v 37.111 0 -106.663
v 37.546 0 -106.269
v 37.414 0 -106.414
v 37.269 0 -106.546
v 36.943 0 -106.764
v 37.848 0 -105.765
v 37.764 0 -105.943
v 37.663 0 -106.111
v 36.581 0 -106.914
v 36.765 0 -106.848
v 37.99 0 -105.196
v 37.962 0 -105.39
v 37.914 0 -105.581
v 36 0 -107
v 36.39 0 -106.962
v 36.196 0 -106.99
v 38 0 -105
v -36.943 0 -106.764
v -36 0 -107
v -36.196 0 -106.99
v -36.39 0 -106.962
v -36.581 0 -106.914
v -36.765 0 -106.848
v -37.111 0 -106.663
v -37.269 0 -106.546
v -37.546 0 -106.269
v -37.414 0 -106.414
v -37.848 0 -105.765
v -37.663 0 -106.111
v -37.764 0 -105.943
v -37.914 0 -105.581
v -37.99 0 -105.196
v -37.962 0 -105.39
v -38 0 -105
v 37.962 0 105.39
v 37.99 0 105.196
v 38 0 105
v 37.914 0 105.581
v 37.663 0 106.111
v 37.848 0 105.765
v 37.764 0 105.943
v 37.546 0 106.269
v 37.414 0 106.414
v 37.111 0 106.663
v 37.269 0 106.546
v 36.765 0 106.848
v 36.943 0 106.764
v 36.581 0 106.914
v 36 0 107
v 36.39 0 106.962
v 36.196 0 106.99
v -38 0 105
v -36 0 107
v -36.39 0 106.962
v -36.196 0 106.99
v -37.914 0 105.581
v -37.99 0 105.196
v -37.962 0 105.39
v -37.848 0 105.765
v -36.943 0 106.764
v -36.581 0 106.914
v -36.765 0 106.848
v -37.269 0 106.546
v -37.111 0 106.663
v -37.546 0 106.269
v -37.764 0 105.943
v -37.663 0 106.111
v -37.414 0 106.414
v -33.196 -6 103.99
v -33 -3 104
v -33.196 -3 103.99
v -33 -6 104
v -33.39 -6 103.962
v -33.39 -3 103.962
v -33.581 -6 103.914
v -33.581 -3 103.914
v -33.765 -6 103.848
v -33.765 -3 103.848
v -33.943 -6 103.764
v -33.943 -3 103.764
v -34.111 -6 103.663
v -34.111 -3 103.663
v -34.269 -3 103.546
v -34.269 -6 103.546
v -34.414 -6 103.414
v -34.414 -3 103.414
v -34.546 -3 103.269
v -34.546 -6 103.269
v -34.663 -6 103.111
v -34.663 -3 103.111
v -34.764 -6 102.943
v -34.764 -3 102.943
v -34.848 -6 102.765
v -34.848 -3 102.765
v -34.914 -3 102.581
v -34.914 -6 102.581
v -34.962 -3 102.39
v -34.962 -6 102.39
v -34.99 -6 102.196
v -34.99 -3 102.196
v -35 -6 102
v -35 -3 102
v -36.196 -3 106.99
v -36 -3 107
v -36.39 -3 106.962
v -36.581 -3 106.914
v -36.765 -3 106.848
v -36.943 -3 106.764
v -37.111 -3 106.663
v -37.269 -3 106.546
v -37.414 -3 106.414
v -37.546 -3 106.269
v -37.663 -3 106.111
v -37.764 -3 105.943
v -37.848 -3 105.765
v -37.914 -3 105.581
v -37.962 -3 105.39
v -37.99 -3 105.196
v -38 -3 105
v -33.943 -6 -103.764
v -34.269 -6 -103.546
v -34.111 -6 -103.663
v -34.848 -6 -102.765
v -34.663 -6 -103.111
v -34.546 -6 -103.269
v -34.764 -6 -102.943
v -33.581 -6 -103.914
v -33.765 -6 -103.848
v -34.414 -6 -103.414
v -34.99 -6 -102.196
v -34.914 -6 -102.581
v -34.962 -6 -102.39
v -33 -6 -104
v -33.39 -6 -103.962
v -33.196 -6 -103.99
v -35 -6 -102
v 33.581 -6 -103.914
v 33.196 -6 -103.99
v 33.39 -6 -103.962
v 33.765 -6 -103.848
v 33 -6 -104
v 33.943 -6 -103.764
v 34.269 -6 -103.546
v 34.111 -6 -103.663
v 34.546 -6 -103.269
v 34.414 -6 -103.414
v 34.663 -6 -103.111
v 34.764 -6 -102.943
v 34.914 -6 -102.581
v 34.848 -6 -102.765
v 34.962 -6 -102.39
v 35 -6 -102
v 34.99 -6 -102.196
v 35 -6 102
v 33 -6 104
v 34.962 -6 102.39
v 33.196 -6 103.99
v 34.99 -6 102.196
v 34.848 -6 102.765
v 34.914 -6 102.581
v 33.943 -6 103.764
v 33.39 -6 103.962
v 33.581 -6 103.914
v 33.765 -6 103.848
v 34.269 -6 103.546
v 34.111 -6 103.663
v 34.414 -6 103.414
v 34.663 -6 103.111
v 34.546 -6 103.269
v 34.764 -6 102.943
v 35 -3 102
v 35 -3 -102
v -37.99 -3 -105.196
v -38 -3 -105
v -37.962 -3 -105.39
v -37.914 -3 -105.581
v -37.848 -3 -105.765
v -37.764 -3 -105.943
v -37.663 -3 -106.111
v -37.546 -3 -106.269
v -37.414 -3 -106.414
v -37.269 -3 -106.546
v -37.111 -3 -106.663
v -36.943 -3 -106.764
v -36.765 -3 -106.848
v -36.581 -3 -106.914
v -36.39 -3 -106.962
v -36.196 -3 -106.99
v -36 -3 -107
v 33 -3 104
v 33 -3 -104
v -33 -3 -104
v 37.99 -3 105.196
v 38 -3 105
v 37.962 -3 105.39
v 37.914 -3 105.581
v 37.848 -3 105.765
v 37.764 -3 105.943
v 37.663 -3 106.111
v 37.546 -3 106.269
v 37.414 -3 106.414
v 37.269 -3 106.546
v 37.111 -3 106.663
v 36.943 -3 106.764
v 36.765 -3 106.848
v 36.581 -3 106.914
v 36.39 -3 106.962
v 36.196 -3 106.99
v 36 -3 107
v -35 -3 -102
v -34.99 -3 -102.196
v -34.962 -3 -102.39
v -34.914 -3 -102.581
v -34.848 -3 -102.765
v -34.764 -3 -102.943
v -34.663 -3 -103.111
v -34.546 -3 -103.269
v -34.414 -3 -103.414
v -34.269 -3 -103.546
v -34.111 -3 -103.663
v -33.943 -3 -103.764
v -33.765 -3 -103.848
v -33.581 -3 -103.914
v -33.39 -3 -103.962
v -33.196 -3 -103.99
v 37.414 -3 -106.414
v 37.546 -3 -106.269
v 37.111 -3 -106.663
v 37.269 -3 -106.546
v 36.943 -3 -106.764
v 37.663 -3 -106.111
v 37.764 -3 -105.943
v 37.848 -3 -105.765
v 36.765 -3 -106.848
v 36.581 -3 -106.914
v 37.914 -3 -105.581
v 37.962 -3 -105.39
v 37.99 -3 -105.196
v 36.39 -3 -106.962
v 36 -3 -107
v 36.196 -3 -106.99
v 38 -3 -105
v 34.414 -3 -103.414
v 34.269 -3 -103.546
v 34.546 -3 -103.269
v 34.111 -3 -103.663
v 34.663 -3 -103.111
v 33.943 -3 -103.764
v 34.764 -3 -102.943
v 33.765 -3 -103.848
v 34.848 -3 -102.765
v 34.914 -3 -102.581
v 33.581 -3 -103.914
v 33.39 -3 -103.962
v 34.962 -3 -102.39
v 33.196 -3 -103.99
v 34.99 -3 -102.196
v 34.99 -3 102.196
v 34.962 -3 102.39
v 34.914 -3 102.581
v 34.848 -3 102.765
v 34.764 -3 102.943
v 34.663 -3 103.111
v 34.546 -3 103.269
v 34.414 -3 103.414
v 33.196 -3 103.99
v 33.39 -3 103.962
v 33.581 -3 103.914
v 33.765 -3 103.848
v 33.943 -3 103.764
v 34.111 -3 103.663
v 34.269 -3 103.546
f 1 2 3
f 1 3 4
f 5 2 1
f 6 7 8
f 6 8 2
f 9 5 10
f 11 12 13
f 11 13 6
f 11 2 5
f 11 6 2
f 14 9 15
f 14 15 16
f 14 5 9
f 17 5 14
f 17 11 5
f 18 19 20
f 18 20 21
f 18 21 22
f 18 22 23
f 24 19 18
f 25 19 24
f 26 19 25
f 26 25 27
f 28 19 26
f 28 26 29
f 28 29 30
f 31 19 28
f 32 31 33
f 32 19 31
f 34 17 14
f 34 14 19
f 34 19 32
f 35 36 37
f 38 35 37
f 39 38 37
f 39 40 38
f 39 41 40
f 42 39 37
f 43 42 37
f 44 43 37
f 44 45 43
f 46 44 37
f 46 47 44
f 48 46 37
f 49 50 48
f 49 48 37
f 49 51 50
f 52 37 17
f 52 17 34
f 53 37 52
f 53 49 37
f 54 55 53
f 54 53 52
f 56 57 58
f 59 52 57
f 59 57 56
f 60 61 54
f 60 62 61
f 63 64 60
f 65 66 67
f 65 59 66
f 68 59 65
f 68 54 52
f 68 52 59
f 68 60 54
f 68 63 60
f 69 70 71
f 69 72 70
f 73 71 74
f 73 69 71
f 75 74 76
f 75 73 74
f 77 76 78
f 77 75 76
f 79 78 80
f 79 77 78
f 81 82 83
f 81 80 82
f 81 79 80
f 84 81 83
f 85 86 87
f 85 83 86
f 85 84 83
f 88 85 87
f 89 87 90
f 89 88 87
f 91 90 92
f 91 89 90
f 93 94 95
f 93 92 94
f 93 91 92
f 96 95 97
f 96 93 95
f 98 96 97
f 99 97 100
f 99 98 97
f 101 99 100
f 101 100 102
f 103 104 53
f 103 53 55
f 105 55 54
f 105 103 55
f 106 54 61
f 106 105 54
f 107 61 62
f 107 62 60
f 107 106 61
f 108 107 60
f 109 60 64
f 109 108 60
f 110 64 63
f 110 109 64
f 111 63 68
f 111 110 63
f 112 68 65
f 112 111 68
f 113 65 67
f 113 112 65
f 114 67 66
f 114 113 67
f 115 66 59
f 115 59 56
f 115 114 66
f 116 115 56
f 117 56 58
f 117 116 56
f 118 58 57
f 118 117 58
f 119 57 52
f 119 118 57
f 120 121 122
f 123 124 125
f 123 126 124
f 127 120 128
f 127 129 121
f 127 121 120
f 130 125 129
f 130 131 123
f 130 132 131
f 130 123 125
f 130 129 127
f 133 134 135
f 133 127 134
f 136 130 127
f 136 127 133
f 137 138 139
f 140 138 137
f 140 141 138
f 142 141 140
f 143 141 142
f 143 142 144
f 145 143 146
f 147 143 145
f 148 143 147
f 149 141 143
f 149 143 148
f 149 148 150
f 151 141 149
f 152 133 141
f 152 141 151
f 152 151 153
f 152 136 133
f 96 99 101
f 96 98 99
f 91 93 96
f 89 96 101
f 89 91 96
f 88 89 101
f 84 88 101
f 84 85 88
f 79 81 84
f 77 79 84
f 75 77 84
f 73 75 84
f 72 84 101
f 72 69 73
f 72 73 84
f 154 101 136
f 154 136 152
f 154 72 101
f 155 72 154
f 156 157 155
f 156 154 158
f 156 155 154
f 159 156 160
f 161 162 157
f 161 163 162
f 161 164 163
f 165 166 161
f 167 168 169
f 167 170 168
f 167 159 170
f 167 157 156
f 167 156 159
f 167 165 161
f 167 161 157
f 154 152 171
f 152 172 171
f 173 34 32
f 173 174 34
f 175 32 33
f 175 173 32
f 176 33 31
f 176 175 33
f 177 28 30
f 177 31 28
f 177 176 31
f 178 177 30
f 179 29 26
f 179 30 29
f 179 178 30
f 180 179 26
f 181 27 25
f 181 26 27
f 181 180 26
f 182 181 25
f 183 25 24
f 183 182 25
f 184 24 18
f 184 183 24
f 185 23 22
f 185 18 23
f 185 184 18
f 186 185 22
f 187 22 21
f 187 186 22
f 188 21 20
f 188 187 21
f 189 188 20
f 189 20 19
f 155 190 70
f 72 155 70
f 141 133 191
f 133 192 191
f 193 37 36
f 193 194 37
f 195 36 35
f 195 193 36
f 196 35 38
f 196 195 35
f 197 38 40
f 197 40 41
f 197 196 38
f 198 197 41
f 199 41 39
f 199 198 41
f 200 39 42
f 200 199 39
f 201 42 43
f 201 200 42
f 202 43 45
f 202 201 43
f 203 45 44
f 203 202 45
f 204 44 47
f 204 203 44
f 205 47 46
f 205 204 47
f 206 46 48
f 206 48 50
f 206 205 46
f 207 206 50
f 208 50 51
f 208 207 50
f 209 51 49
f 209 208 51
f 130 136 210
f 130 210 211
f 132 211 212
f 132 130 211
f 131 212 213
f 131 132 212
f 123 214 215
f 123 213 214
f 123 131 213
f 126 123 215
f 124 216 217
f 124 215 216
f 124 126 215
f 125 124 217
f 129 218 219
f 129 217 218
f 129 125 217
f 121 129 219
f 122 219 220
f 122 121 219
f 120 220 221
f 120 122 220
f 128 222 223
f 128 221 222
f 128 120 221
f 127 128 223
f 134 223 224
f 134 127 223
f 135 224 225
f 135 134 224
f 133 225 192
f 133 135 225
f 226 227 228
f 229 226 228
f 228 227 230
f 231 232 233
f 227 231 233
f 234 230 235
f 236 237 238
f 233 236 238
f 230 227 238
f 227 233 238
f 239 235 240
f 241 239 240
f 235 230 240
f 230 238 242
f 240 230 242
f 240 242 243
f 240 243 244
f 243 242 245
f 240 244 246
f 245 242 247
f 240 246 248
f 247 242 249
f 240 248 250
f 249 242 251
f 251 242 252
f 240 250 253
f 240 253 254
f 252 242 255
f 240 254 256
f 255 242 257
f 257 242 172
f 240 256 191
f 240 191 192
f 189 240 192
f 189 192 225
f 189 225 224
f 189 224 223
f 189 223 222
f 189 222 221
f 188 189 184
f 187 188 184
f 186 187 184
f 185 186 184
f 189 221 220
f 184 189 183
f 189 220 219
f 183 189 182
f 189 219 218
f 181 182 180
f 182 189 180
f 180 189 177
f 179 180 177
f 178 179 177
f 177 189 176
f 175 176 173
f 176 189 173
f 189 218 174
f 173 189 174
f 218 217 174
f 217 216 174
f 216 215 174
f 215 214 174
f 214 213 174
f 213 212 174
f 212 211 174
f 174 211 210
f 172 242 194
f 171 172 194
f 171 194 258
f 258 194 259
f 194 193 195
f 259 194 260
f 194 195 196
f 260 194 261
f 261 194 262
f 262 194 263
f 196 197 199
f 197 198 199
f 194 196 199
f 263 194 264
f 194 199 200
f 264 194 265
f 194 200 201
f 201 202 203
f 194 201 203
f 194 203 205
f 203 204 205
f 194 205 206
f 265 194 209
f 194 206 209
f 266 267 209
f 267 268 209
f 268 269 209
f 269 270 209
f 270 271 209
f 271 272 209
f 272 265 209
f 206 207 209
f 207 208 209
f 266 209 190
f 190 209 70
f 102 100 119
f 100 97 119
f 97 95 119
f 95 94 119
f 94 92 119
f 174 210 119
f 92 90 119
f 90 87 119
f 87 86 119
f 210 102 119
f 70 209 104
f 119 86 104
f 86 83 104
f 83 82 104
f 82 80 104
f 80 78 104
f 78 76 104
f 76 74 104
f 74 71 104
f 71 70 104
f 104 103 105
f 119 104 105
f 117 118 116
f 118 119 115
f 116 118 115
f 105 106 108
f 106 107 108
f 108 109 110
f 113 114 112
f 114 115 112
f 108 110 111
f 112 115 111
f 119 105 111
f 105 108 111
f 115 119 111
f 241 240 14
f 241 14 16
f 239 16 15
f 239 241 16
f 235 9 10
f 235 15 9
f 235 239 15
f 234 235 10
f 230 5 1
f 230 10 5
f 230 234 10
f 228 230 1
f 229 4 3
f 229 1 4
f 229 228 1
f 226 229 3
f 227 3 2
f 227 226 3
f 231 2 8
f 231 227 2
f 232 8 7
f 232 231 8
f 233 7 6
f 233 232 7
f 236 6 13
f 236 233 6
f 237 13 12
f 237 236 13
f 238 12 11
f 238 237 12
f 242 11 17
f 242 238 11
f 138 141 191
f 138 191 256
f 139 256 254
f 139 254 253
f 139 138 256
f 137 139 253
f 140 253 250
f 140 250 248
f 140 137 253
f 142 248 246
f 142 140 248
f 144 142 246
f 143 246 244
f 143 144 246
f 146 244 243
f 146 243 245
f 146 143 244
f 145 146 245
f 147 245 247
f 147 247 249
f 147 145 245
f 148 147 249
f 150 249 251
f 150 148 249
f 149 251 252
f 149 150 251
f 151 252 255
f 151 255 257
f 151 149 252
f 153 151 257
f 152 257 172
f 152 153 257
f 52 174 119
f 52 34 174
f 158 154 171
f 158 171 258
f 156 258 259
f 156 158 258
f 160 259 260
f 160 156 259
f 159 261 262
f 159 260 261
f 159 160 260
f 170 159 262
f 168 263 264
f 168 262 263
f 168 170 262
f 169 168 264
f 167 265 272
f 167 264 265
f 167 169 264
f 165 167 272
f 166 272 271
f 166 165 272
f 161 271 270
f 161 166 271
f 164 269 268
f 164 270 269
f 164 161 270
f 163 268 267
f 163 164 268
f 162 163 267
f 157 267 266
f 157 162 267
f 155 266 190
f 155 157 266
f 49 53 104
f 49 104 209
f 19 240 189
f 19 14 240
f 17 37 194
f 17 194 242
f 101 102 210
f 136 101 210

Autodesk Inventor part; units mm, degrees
ref_plane "YZ Plane" through (0, 0, 0) normal (1, 0, 0) x (0, 1, 0)
ref_plane "XZ Plane" through (0, 0, 0) normal (0, 1, 0) x (-1, 0, 0)
ref_plane "XY Plane" through (0, 0, 0) normal (0, 0, 1) x (1, 0, 0)
sketch "Sketch1" plane through (0, 0, 0) normal (0, 1, 0) x (-1, 0, 0)
  line L0 (-38, -107) -> (38, -107)
  line L1 (38, -107) -> (38, 107)
  line L2 (38, 107) -> (-38, 107)
  line L3 (-38, 107) -> (-38, -107)
  line L4 (-38, -107) -> (38, 107) construction
  line L5 (38, -107) -> (-38, 107) construction
  point P0 (0, 0)
  dimension "d0" = 76
  dimension "d1" = 214
extrude "Extrusion1" add sketch "Sketch1" against normal blind 3
sketch "Sketch2" plane through (0, -3, 0) normal (0, -1, 0) x (1, 0, 0)
  line L0 (-38, 107) -> (-38, -107) projected
  line L1 (-38, -107) -> (38, -107) projected
  line L2 (38, -107) -> (38, 107) projected
  line L3 (38, 107) -> (-38, 107) projected
  line L4 (35, 104) -> (-35, 104)
  line L5 (-35, 104) -> (-35, -104)
  line L6 (-35, -104) -> (35, -104)
  line L7 (35, -104) -> (35, 104)
  line L8 (35, 104) -> (-35, -104) construction
  line L9 (-35, 104) -> (35, -104) construction
  point P0 (0, 0)
  dimension "d4" = 3
  dimension "d5" = 3
extrude "Extrusion2" add sketch "Sketch2" along normal blind 3 contours L7 L6 L5 L4
fillet "Fillet1" radius 2 8 edges at (35, -4.5, 104) (-35, -4.5, 104) (38, -1.5, 107) (-38, -1.5, 107) (35, -4.5, -104) (38, -1.5, -107) (-35, -4.5, -104) (-38, -1.5, -107)
properties part number "module-lid_command"
